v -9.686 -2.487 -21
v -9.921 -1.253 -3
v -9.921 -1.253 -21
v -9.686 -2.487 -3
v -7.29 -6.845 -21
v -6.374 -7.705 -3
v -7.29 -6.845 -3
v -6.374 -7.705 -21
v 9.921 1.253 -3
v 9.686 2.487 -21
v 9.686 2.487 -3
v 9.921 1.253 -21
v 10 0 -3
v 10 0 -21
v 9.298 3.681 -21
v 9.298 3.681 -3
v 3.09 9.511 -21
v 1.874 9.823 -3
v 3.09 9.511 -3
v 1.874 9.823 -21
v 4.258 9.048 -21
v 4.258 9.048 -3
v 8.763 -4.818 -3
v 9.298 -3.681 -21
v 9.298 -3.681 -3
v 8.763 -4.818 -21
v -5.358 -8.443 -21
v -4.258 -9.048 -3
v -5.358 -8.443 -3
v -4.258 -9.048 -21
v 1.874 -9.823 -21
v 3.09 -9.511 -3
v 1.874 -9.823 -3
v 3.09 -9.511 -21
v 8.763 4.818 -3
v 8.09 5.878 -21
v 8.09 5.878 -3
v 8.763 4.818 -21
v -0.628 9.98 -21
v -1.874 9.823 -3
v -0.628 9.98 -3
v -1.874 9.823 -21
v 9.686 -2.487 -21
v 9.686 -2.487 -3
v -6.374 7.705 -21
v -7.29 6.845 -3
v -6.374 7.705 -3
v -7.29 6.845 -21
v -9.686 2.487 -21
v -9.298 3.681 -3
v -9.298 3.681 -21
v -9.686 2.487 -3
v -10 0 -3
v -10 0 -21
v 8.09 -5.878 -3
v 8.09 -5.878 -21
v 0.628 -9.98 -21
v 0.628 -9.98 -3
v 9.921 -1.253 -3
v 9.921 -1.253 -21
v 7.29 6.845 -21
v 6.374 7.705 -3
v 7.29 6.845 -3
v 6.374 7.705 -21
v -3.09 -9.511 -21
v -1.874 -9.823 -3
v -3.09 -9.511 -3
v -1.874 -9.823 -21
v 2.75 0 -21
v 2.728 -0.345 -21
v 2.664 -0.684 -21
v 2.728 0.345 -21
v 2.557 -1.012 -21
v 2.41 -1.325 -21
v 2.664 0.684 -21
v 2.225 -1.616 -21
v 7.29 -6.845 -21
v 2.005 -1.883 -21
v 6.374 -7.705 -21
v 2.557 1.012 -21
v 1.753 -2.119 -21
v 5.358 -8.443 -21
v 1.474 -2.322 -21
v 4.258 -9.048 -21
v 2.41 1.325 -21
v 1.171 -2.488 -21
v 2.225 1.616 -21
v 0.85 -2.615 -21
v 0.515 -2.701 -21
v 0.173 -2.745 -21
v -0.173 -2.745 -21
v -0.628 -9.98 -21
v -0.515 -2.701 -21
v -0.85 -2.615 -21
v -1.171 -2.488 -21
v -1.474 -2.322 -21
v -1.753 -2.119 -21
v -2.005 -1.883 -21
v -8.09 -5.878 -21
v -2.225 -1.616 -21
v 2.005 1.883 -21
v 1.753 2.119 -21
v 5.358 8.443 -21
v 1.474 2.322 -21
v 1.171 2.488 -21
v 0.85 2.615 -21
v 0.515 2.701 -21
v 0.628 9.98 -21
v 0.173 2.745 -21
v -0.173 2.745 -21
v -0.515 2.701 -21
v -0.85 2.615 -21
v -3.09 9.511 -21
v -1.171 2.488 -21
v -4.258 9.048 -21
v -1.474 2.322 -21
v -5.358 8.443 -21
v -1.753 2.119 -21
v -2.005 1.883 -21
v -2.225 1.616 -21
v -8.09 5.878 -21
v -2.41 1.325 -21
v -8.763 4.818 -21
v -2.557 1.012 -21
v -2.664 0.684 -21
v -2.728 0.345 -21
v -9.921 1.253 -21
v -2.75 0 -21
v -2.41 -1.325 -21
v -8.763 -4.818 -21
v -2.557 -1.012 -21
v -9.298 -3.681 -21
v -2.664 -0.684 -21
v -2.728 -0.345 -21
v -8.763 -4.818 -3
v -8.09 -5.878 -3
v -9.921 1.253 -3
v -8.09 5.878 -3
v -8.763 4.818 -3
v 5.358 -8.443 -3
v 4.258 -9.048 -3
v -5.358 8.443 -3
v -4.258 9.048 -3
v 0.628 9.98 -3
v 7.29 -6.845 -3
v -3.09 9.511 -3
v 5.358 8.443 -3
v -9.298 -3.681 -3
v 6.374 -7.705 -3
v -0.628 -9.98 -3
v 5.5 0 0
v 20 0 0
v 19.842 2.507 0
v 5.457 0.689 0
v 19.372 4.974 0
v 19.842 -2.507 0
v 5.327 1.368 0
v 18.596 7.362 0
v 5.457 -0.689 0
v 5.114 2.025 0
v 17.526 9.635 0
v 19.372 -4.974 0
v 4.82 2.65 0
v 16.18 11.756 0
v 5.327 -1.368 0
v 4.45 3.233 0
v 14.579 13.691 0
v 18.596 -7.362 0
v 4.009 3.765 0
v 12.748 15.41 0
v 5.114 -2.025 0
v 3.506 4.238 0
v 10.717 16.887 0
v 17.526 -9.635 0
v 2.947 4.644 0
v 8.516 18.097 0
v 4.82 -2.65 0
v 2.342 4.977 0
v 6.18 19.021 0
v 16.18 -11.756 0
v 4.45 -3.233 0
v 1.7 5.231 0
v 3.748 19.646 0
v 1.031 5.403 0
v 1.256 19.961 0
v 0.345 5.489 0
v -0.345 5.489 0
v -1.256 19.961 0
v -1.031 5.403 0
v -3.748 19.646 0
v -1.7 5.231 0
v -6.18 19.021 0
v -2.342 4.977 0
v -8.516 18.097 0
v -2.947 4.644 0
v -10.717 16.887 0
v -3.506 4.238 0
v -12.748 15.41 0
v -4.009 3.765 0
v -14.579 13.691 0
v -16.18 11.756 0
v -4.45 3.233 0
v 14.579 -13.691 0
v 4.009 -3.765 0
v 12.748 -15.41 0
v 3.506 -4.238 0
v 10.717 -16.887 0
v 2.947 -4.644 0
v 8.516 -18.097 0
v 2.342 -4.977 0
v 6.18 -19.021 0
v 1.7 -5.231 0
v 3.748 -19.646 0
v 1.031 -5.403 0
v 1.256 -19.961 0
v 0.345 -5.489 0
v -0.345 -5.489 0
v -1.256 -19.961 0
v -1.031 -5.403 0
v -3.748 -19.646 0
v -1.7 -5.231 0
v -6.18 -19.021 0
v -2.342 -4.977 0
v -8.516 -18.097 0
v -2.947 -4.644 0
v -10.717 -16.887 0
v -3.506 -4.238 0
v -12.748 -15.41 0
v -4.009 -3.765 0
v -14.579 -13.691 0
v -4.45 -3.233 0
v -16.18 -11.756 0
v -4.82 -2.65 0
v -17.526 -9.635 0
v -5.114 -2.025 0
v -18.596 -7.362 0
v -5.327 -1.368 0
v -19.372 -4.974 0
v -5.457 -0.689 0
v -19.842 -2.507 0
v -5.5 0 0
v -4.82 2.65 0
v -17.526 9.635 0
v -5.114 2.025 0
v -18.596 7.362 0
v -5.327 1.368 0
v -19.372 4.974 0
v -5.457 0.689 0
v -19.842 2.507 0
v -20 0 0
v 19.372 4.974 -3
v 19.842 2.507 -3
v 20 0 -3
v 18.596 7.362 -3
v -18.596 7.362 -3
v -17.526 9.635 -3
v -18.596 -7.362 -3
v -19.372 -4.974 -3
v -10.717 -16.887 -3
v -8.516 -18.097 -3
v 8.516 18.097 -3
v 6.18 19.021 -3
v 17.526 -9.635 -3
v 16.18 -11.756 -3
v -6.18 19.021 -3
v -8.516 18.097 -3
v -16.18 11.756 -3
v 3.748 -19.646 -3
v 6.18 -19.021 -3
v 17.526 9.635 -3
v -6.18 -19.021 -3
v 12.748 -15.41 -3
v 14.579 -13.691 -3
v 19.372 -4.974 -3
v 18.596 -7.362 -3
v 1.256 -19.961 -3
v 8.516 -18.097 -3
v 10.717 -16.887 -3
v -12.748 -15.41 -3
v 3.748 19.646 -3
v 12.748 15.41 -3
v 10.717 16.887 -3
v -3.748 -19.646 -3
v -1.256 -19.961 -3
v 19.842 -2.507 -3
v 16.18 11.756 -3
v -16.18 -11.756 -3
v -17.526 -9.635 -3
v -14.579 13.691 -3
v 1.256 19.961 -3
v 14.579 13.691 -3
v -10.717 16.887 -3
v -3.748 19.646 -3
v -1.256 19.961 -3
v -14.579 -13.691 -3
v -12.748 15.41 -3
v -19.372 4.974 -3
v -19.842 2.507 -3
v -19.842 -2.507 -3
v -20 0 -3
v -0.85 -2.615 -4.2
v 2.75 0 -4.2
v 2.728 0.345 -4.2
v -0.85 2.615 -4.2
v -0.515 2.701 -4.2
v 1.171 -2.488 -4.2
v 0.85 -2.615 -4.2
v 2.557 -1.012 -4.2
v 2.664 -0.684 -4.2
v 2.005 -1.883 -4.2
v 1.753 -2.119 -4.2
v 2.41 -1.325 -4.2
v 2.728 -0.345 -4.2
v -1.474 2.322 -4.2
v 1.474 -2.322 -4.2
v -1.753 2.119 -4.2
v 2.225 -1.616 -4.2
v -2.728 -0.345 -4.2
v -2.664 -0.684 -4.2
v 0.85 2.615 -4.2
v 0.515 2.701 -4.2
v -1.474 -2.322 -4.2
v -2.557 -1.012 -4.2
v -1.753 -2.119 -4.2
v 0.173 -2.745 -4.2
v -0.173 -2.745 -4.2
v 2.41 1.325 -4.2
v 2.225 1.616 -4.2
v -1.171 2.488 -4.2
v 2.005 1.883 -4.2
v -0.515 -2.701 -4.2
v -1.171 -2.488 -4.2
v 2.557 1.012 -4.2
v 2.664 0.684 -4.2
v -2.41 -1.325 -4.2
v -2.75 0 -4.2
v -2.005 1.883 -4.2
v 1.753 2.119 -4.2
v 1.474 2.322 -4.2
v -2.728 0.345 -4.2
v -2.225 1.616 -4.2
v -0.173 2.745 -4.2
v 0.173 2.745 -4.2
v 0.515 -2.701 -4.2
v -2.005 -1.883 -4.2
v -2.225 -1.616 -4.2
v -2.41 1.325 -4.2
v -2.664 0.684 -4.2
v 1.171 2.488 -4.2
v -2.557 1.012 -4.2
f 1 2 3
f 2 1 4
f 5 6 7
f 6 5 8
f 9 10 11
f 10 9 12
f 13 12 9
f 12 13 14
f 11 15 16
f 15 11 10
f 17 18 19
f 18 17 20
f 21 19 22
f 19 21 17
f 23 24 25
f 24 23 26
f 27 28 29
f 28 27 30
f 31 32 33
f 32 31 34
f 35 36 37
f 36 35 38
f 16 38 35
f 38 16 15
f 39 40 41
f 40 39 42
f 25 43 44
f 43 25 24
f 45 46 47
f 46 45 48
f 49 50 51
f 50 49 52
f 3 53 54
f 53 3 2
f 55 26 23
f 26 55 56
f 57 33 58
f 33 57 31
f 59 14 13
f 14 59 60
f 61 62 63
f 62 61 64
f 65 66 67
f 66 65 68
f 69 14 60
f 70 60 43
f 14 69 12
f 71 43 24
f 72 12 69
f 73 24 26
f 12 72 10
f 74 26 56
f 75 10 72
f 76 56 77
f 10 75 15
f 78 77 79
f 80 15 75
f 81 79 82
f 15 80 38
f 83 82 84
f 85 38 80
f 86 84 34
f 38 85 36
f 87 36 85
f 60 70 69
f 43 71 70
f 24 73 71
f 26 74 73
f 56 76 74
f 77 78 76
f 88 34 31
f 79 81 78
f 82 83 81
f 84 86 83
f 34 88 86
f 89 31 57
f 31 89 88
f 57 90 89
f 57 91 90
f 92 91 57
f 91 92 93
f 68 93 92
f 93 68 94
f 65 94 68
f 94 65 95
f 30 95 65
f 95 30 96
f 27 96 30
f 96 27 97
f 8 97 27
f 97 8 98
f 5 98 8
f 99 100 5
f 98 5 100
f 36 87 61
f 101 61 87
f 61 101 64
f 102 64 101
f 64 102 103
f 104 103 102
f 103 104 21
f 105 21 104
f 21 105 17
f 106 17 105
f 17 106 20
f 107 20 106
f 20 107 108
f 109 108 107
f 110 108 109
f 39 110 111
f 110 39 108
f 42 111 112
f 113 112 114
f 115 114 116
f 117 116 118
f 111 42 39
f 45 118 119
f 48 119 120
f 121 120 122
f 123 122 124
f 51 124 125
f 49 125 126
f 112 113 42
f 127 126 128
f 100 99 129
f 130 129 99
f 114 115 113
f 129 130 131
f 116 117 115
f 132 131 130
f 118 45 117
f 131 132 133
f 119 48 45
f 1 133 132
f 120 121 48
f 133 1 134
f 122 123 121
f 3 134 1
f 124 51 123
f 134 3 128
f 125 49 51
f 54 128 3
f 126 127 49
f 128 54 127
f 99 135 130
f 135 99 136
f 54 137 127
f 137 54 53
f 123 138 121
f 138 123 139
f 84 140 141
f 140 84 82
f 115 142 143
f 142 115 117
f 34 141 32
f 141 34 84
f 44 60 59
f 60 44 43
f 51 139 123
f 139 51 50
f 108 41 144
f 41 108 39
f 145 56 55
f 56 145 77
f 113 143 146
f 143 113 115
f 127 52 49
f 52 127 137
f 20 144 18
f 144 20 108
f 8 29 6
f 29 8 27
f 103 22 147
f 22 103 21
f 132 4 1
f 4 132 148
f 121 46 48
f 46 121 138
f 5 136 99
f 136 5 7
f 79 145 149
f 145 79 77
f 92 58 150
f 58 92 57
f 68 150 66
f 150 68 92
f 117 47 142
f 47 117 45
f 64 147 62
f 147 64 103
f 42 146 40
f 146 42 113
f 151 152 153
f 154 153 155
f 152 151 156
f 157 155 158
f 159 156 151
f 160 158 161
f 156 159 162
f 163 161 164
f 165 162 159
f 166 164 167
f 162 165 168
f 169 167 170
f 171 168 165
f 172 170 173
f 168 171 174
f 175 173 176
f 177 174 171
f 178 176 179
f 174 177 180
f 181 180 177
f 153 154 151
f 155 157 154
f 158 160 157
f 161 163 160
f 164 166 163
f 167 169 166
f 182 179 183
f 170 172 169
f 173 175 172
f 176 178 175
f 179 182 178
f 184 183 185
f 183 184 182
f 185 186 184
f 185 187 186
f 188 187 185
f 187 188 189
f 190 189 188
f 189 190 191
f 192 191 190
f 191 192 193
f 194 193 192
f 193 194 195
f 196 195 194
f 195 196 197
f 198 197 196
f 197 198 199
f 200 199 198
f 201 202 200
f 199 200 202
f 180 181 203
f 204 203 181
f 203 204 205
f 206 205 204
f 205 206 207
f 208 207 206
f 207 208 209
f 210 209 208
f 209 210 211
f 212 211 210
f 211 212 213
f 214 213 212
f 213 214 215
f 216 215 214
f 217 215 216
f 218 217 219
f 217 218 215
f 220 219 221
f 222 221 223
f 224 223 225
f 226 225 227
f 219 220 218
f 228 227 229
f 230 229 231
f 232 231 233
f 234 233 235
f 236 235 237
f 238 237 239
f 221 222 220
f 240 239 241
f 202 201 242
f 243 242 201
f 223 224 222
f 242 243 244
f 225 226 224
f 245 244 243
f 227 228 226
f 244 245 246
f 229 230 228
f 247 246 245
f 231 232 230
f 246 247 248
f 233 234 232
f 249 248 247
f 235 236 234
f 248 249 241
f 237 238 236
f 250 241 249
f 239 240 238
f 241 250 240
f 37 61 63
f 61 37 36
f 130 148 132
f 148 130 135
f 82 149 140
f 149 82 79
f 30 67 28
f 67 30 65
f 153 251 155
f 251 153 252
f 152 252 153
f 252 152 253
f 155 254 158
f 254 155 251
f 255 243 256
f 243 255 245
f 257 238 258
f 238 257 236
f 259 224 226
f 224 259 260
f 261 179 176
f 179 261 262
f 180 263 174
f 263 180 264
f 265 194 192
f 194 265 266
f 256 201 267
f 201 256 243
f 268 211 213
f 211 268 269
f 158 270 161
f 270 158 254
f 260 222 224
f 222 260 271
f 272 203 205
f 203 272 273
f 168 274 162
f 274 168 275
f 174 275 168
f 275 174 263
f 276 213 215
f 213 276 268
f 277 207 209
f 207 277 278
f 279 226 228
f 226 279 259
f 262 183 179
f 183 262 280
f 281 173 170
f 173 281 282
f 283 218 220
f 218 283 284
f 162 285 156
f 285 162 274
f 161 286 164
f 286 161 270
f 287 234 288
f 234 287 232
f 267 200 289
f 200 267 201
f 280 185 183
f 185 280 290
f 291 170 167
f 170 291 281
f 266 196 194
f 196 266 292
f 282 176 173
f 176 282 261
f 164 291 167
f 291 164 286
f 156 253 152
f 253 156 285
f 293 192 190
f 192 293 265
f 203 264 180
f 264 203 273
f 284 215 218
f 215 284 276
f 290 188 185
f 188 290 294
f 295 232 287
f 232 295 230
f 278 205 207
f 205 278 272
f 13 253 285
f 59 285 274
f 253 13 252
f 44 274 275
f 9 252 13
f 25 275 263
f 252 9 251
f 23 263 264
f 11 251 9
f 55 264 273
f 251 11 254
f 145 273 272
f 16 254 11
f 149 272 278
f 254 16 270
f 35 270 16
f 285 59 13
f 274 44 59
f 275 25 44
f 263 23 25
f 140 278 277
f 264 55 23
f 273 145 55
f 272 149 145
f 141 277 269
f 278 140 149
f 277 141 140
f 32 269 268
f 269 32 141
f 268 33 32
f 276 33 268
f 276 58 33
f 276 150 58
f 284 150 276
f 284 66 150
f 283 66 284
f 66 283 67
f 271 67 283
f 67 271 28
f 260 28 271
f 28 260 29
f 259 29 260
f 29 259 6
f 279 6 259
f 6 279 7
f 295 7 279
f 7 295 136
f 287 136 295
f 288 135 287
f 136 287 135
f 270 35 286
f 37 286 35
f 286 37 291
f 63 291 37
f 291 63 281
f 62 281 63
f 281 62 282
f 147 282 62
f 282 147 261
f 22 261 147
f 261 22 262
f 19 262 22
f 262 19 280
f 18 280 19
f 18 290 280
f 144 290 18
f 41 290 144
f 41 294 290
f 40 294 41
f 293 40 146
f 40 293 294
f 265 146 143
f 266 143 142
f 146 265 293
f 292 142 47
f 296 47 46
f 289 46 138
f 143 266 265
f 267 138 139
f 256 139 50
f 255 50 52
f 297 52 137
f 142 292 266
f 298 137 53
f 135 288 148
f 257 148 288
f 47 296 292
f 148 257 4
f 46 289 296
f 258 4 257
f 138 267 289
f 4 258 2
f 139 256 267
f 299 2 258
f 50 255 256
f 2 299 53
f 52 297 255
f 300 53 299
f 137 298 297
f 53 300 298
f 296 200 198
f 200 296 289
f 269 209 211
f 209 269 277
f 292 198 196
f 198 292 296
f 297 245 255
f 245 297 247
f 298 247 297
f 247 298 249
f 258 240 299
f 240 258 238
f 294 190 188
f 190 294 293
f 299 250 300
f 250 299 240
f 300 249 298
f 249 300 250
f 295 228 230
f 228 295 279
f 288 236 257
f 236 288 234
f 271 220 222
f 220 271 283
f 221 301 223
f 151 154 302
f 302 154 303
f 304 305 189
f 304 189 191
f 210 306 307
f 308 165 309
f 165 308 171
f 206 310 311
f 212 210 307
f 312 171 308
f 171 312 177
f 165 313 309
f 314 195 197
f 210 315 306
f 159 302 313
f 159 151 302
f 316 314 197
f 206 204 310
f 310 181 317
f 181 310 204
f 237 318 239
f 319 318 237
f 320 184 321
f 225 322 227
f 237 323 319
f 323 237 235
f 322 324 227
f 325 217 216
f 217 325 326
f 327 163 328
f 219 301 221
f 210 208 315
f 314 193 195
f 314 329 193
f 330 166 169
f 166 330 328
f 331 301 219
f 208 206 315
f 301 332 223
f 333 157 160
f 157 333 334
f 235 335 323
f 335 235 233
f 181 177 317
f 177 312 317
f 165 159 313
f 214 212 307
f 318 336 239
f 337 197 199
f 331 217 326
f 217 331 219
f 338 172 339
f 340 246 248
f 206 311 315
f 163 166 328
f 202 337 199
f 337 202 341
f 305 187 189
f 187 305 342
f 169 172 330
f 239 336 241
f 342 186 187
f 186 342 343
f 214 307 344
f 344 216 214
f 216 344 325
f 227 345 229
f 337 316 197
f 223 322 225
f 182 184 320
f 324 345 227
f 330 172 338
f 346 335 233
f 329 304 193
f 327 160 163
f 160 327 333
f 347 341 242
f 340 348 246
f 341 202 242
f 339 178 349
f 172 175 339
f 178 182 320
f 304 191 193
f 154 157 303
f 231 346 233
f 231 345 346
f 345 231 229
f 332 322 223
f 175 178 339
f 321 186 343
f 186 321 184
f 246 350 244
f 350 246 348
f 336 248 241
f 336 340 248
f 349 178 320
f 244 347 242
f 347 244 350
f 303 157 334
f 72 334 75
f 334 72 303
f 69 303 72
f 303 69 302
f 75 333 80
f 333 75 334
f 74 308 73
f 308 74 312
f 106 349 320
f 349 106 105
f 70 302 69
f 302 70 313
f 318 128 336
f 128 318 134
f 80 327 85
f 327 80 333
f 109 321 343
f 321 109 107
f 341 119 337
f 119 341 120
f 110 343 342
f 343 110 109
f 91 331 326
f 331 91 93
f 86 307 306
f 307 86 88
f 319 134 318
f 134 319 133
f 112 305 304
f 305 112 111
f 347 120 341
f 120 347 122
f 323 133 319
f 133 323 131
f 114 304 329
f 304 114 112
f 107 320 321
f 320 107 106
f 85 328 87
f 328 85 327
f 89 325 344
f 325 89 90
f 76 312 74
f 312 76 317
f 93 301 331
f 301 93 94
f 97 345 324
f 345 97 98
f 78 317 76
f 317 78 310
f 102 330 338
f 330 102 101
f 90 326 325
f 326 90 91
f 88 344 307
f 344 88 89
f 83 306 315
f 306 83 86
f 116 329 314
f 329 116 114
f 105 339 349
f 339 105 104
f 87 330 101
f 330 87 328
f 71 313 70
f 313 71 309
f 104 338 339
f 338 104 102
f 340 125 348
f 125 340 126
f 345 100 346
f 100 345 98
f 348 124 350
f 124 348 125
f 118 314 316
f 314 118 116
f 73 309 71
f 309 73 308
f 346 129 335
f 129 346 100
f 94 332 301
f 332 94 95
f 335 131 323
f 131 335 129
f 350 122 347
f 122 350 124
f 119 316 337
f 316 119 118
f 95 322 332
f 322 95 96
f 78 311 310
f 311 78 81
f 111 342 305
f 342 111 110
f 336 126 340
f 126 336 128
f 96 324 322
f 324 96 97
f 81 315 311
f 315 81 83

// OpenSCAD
$fn = 50;


difference() {
	union() {
		translate(v = [0, 0, -21.0000000000]) {
			cylinder(h = 21, r = 10.0000000000);
		}
		translate(v = [0, 0, -3.0000000000]) {
			cylinder(h = 3, r = 20.0000000000);
		}
	}
	union() {
		translate(v = [0, 0, 0]) {
			rotate(a = [0, 0, 0]) {
				difference() {
					union() {
						#translate(v = [0, 0, -21.0000000000]) {
							cylinder(h = 21, r = 2.2500000000);
						}
						#translate(v = [0, 0, -4.2000000000]) {
							cylinder(h = 4.2000000000, r = 10.0000000000, r1 = 2.7500000000, r2 = 5.5000000000);
						}
						#translate(v = [0, 0, -21.0000000000]) {
							cylinder(h = 21, r = 2.7500000000);
						}
						#translate(v = [0, 0, -21.0000000000]) {
							cylinder(h = 21, r = 2.2500000000);
						}
					}
					union();
				}
			}
		}
	}
}
